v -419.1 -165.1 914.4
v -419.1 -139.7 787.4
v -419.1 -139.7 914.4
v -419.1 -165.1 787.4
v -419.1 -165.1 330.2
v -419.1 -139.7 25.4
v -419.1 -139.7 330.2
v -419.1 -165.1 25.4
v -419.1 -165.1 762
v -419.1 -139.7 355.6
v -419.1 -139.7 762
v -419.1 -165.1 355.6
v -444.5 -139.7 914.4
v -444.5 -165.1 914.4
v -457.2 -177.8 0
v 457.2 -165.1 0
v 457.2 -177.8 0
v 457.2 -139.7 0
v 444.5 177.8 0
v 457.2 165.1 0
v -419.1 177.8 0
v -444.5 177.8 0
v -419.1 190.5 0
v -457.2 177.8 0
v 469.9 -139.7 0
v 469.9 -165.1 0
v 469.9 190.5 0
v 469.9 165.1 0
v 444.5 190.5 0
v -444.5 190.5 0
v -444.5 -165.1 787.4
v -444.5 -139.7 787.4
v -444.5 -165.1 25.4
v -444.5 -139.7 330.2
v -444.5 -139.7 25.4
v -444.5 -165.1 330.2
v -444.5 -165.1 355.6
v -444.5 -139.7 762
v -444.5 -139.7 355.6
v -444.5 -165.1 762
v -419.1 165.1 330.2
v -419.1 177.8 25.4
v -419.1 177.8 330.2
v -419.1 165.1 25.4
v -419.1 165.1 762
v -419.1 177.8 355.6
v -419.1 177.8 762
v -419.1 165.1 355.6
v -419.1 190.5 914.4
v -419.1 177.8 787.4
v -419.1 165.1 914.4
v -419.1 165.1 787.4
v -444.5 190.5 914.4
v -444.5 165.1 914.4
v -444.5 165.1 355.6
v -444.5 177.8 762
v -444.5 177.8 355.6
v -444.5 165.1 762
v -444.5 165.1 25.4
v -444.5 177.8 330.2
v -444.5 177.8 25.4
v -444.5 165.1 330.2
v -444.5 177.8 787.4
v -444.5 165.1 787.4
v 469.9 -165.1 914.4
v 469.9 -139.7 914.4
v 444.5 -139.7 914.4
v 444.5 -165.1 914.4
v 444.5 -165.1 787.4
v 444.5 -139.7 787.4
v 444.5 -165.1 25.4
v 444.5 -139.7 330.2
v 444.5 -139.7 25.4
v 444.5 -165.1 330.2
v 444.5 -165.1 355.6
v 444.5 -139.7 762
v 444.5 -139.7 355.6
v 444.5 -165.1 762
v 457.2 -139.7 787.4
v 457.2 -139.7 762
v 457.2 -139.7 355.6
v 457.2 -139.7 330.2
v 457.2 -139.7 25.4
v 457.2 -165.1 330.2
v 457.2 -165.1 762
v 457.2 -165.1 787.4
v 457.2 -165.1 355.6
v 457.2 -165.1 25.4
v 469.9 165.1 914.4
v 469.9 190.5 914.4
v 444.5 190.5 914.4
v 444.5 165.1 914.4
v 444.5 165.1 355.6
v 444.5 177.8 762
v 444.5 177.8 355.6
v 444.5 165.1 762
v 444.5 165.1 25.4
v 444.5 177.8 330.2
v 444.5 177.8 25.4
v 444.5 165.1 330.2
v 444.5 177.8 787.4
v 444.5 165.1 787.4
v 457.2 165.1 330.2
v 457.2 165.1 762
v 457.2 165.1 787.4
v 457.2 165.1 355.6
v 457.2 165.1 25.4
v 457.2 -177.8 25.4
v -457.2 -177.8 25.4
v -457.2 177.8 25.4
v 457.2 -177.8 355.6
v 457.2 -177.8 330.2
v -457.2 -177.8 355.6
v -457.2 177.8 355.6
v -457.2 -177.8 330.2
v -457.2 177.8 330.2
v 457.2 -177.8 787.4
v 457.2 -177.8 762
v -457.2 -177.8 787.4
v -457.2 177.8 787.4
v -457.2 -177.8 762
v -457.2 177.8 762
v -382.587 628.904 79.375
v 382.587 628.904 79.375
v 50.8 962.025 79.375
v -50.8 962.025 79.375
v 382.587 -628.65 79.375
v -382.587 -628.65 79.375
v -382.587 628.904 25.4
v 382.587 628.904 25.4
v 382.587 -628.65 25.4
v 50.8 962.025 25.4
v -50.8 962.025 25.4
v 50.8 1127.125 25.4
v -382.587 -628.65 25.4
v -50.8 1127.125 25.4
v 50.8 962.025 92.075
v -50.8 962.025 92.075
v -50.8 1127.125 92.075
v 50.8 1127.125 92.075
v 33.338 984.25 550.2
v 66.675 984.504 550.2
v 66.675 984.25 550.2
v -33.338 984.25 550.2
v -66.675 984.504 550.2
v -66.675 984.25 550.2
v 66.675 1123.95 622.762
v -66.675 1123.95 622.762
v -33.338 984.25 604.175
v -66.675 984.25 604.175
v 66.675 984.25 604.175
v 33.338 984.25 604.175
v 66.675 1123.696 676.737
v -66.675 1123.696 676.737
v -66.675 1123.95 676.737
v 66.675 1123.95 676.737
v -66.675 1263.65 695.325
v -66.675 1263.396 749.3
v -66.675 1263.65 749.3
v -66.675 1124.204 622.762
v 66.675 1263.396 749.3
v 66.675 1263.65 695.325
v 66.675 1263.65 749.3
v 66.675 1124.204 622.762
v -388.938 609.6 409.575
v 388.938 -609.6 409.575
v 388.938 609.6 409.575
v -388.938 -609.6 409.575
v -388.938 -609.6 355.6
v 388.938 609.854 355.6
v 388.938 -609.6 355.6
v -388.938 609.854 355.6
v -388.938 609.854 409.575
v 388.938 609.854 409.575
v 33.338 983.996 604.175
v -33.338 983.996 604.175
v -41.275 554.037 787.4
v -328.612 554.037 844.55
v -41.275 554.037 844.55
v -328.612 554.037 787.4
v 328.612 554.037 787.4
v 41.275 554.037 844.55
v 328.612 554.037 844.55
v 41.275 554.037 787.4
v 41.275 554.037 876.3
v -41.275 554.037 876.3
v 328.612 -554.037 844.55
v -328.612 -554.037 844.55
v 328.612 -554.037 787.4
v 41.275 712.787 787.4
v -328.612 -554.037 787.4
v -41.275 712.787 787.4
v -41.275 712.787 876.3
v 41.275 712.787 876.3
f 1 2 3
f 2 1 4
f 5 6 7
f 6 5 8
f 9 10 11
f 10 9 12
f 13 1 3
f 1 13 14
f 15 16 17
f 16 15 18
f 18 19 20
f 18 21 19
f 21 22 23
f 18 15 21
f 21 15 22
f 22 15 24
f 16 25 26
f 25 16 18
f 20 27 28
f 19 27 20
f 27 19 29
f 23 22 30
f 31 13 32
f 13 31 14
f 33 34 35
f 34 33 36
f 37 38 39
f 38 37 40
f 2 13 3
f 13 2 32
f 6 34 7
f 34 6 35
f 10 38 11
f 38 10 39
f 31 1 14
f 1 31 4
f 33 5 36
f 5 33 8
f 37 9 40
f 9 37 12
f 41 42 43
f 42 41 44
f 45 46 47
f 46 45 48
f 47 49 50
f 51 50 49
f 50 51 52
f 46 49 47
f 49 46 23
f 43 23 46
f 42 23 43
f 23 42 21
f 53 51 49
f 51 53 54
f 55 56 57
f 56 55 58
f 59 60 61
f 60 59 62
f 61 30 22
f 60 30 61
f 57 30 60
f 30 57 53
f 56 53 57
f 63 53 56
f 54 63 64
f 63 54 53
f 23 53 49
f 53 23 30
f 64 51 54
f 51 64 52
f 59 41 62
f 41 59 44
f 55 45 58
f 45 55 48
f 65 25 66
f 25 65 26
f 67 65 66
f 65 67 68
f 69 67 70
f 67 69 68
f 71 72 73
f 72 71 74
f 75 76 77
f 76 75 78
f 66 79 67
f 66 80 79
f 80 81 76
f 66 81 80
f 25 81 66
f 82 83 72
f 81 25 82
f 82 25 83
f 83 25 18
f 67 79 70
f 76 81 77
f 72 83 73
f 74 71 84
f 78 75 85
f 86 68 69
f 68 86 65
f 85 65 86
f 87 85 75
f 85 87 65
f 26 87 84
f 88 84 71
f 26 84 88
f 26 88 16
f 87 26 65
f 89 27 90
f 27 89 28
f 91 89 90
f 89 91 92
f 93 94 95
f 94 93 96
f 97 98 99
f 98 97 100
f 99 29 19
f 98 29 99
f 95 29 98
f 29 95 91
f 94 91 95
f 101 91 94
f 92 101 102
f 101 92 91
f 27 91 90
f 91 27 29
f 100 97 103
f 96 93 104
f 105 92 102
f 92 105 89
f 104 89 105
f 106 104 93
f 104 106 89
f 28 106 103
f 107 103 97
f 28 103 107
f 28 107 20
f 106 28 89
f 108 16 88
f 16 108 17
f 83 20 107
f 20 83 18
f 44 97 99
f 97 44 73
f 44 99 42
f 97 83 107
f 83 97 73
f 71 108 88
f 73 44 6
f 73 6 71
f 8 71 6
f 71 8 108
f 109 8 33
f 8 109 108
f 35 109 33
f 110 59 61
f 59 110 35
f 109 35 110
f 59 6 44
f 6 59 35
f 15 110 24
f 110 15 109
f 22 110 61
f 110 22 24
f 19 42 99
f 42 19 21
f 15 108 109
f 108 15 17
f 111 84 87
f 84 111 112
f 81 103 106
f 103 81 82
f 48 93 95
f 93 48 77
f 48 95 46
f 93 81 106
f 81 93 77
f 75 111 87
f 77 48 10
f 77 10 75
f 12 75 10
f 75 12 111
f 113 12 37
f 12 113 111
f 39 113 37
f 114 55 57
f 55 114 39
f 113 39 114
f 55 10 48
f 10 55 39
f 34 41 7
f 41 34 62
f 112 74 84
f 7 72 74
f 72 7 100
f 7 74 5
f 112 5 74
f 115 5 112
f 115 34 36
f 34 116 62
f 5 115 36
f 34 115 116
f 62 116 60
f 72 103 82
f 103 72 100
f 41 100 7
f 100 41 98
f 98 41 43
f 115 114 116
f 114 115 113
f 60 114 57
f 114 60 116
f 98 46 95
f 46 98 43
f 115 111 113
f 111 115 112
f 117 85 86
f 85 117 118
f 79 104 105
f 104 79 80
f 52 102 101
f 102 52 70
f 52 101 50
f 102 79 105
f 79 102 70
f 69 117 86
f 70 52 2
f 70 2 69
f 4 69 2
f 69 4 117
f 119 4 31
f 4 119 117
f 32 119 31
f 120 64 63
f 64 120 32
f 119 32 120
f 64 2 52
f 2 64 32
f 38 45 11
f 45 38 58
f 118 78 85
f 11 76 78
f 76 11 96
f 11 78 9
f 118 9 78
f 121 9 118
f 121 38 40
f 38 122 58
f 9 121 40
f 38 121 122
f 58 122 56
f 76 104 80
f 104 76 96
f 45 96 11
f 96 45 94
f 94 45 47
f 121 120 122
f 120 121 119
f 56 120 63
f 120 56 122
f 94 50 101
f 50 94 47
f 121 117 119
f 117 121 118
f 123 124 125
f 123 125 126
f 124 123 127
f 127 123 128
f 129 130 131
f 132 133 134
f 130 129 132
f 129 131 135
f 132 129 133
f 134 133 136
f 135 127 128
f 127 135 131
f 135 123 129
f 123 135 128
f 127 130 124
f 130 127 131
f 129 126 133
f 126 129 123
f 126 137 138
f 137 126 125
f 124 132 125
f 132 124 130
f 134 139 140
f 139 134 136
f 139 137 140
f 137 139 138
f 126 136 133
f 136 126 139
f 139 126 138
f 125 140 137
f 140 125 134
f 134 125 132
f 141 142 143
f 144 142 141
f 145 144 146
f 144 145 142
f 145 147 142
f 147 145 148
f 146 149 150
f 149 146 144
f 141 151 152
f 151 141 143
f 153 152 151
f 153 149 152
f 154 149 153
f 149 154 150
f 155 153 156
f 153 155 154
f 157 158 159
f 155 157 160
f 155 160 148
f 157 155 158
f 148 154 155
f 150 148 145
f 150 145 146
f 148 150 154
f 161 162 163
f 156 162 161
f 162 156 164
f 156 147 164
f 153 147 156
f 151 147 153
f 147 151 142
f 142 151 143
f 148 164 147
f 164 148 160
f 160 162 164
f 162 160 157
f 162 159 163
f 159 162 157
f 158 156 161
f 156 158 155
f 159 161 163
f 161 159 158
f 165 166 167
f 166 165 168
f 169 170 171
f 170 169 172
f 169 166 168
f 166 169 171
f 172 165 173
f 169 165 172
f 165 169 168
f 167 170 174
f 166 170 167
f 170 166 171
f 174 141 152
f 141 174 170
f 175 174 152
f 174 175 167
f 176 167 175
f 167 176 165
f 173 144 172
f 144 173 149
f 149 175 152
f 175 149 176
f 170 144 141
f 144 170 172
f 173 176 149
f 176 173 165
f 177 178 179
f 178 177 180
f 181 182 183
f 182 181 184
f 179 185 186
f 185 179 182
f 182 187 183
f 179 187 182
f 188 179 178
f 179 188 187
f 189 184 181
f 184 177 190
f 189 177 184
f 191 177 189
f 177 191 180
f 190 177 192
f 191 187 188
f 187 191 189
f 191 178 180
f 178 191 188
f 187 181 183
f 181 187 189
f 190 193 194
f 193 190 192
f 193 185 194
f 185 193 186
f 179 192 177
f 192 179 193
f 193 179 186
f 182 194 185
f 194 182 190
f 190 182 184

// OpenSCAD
// Muon detector setup - revised OpenSCAD model v9
// Units in source are inches; OpenSCAD geometry is generated in mm.
//
// Changes in this version:
// 1) Bottom slab guide is now flush with the slab (no extra rise above slab top).
// 2) Middle PMTs now use the same hull-based oblique construction idea as the guide.
// 3) Middle PMTs still start at the end of the guide, with their bottoms flush
//    to the guide bottom at the exit face.

IN = 25.4;
EPS = 0.01 * IN;

function inch(x) = x * IN;
function deg(x) = x * 180 / PI;

// ---------- Display toggles ----------
SHOW_SHELF = true;
EXPLODED_VIEW = false;   // true = place assemblies side-by-side for inspection
SHOW_AXES = false;
ROTATE_DETECTORS_90 = true;

// ---------- Shelf parameters (from Amazon listing) ----------
SHELF_W = 36;
SHELF_D = 14;
SHELF_H = 36;
SHELF_THICK = 1;
POST_SIZE = 1;

// Middle shelf lowered so the middle assembly clears the top detector.
SHELF_ZS = [0, 13, 30];

// ---------- Top slab ----------
TOP_SLAB_L = 43.625;
TOP_SLAB_W = 25.875;
TOP_SLAB_H = 2.25;
TOP_PMT_L = 6.25;
TOP_PMT_W = 3.25;
TOP_PMT_H = 3.5;

// ---------- Bottom slab ----------
BOT_SLAB_L = 49.5;
BOT_SLAB_W = 30.125;
BOT_SLAB_H = 2.125;
BOT_GUIDE_L = 13.125;
BOT_GUIDE_W1 = 30.125;
BOT_GUIDE_W2 = 4.0;
BOT_GUIDE_H = 2.125;               // guide thickness; now flush with slab thickness
BOT_GUIDE_RISE = 0.0;              // no vertical rise; guide is flush with slab
BOT_PMT_L = 6.5;
BOT_PMT_W = 4.0;
BOT_PMT_H = 2.625;

// ---------- Middle slab ----------
MID_SLAB_L = 48.0;
MID_SLAB_W = 30.625;
MID_SLAB_H = 2.125;
MID_GUIDE_L = 14.75;
MID_GUIDE_W1 = 30.625;
MID_GUIDE_W2 = 2.625;
MID_GUIDE_H = 2.125;               // constant tunnel thickness per latest instruction
MID_PMT_L = 5.5;
MID_PMT_W = 2.625;
MID_PMT_H = 2.125;
MID_PMT_GAP_Y = 0.0;

// --- Middle detector slope control ---
// User requested a steeper shared angle for the middle light tunnel and PMT,
// with the total middle component reaching 15.5 in overall height.
// Here, "total height" is interpreted as the vertical distance from the
// bottom of the middle slab / guide to the highest point of the last PMT.
MID_TOTAL_HEIGHT = 15.5;

// The current middle PMT layout is a 2x2 cluster built as two PMT columns
// in the x-direction, so the sloped run extends across:
//   guide length + first PMT length + second PMT length
MID_TOTAL_RUN = MID_GUIDE_L + 2 * MID_PMT_L;

// Because the guide and PMTs all keep the same constant thickness, the bottom
// surface must rise by (target top height - thickness) over the full run.
MID_TOTAL_RISE = MID_TOTAL_HEIGHT - MID_PMT_H;
MID_SLOPE_PER_IN = MID_TOTAL_RISE / MID_TOTAL_RUN;

// Rise of the guide bottom from its start to its exit face.
MID_GUIDE_RISE = MID_GUIDE_L * MID_SLOPE_PER_IN;
MID_GUIDE_ANGLE = deg(atan(MID_SLOPE_PER_IN));

// Rise of each PMT section so each one follows the same slope as the guide.
MID_PMT_RISE = MID_PMT_L * MID_SLOPE_PER_IN;

// ---------- Utility modules ----------
module centered_box_xy(l, w, h) {
    translate([-inch(l)/2, -inch(w)/2, 0])
        cube([inch(l), inch(w), inch(h)]);
}
//
module slab_body(l, w, h) {
    centered_box_xy(l, w, h);
}
//
module pmt_block(l, w, h, x_start, z_start, y_center=0) {
    translate([inch(x_start), inch(y_center - w/2), inch(z_start)])
        cube([inch(l), inch(w), inch(h)]);
}
//
// Oblique PMT made the same basic way as the guide: a hull between two equal-size
// rectangular end faces, with the far face shifted upward. This keeps the PMT
// pointing in the same direction as the guide without the odd rotation behavior
// seen in the previous version.
module oblique_pmt_same_as_guide(l, w, h, rise, x_start, z_start, y_center=0) {
    hull() {
        translate([inch(x_start), inch(y_center - w/2), inch(z_start)])
            cube([EPS, inch(w), inch(h)]);

        translate([inch(x_start + l) - EPS, inch(y_center - w/2), inch(z_start + rise)])
            cube([EPS, inch(w), inch(h)]);
    }
}

// Constant-thickness guide that can rise diagonally as it extends outward.
// The attached face starts at z_base_start and the outer face is shifted up by `rise`.
module side_attached_constant_thickness_guide(l, w1, w2, thickness, rise, x_attach, z_base_start=0) {
    hull() {
        translate([inch(x_attach), -inch(w1)/2, inch(z_base_start)])
            cube([EPS, inch(w1), inch(thickness)]);

        translate([inch(x_attach + l) - EPS, -inch(w2)/2, inch(z_base_start + rise)])
            cube([EPS, inch(w2), inch(thickness)]);
    }
}

module axes(len=8) {
    color("red")   cube([inch(len), inch(0.15), inch(0.15)]);
    color("green") cube([inch(0.15), inch(len), inch(0.15)]);
    color("blue")  cube([inch(0.15), inch(0.15), inch(len)]);
}

module shelf_unit() {
    color("silver") {
        for (xsign = [-1, 1], ysign = [-1, 1]) {
            translate([
                xsign * (inch(SHELF_W)/2 - inch(POST_SIZE)/2),
                ysign * (inch(SHELF_D)/2 - inch(POST_SIZE)/2),
                0
            ])
                cube([inch(POST_SIZE), inch(POST_SIZE), inch(SHELF_H)]);
        }

        for (z0 = SHELF_ZS) {
            translate([-inch(SHELF_W)/2, -inch(SHELF_D)/2, inch(z0)])
                cube([inch(SHELF_W), inch(SHELF_D), inch(SHELF_THICK)]);
        }
    }
}

module maybe_rotate_detector() {
    if (ROTATE_DETECTORS_90)
        rotate([0, 0, 90]) children();
    else
        children();
}

// ---------- Detector assemblies ----------
module top_slab_assembly() {
    maybe_rotate_detector() {
        color([0.2, 0.55, 0.95, 0.65])
            slab_body(TOP_SLAB_L, TOP_SLAB_W, TOP_SLAB_H);

        // Top PMT attached at the slab edge, with its bottom flush to slab bottom.
        color([0.22, 0.22, 0.22, 0.95])
            pmt_block(
                TOP_PMT_L,
                TOP_PMT_W,
                TOP_PMT_H,
                TOP_SLAB_L/2,
                0,
                0
            );
    }
}

module bottom_slab_assembly() {
    maybe_rotate_detector() {
        color([0.15, 0.70, 0.80, 0.65])
            slab_body(BOT_SLAB_L, BOT_SLAB_W, BOT_SLAB_H);

        // Bottom guide is flush with the slab: same bottom, same top, no extra rise.
        color([0.70, 0.70, 0.75, 0.90])
            side_attached_constant_thickness_guide(
                BOT_GUIDE_L,
                BOT_GUIDE_W1,
                BOT_GUIDE_W2,
                BOT_GUIDE_H,
                BOT_GUIDE_RISE,
                BOT_SLAB_L/2,
                0
            );

        // Bottom PMT begins at the outer edge of the guide.
        // Its bottom is flush with the guide bottom.
        color([0.22, 0.22, 0.22, 0.95])
            pmt_block(
                BOT_PMT_L,
                BOT_PMT_W,
                BOT_PMT_H,
                BOT_SLAB_L/2 + BOT_GUIDE_L,
                0,
                0
            );
    }
}

module middle_slab_assembly() {
    maybe_rotate_detector() {
        color([0.25, 0.82, 0.55, 0.65])
            slab_body(MID_SLAB_L, MID_SLAB_W, MID_SLAB_H);

        // Constant-thickness diagonal guide attached to slab outer edge.
        color([0.78, 0.78, 0.83, 0.90])
            side_attached_constant_thickness_guide(
                MID_GUIDE_L,
                MID_GUIDE_W1,
                MID_GUIDE_W2,
                MID_GUIDE_H,
                MID_GUIDE_RISE,
                MID_SLAB_L/2,
                0
            );

        // Best-effort 2x2 PMT cluster at the guide exit.
        // Do the PMTs the same way as the guide: use oblique prisms built with hull().
        // That keeps them visually parallel to the guide in side view.
        // The bottoms start flush with the guide bottom at the exit face.
        x_front = MID_SLAB_L/2 + MID_GUIDE_L;
        z_front = MID_GUIDE_RISE;
        y_top =  MID_PMT_W/2 + MID_PMT_GAP_Y/2;
        y_bot = -MID_PMT_W/2 - MID_PMT_GAP_Y/2;

        color([0.18, 0.18, 0.18, 0.95]) {
            oblique_pmt_same_as_guide(MID_PMT_L, MID_PMT_W, MID_PMT_H, MID_PMT_RISE, x_front,             z_front, y_top);
            oblique_pmt_same_as_guide(MID_PMT_L, MID_PMT_W, MID_PMT_H, MID_PMT_RISE, x_front,             z_front, y_bot);
            oblique_pmt_same_as_guide(MID_PMT_L, MID_PMT_W, MID_PMT_H, MID_PMT_RISE, x_front + MID_PMT_L, z_front + MID_PMT_RISE, y_top);
            oblique_pmt_same_as_guide(MID_PMT_L, MID_PMT_W, MID_PMT_H, MID_PMT_RISE, x_front + MID_PMT_L, z_front + MID_PMT_RISE, y_bot);
        }
    }
}

// ---------- Scene placement ----------
module exploded_layout() {
    dx = inch(85);
    translate([-dx, 0, 0]) bottom_slab_assembly();
    middle_slab_assembly();
    translate([ dx, 0, 0]) top_slab_assembly();
}

module shelf_layout() {
    if (SHOW_SHELF) shelf_unit();

    translate([0, 0, inch(SHELF_ZS[0] + SHELF_THICK)]) bottom_slab_assembly();
    translate([0, 0, inch(SHELF_ZS[1] + SHELF_THICK)]) middle_slab_assembly();
    translate([0, 0, inch(SHELF_ZS[2] + SHELF_THICK)]) top_slab_assembly();
}

if (SHOW_AXES) axes();

if (EXPLODED_VIEW)
    exploded_layout();
else
    shelf_layout();
